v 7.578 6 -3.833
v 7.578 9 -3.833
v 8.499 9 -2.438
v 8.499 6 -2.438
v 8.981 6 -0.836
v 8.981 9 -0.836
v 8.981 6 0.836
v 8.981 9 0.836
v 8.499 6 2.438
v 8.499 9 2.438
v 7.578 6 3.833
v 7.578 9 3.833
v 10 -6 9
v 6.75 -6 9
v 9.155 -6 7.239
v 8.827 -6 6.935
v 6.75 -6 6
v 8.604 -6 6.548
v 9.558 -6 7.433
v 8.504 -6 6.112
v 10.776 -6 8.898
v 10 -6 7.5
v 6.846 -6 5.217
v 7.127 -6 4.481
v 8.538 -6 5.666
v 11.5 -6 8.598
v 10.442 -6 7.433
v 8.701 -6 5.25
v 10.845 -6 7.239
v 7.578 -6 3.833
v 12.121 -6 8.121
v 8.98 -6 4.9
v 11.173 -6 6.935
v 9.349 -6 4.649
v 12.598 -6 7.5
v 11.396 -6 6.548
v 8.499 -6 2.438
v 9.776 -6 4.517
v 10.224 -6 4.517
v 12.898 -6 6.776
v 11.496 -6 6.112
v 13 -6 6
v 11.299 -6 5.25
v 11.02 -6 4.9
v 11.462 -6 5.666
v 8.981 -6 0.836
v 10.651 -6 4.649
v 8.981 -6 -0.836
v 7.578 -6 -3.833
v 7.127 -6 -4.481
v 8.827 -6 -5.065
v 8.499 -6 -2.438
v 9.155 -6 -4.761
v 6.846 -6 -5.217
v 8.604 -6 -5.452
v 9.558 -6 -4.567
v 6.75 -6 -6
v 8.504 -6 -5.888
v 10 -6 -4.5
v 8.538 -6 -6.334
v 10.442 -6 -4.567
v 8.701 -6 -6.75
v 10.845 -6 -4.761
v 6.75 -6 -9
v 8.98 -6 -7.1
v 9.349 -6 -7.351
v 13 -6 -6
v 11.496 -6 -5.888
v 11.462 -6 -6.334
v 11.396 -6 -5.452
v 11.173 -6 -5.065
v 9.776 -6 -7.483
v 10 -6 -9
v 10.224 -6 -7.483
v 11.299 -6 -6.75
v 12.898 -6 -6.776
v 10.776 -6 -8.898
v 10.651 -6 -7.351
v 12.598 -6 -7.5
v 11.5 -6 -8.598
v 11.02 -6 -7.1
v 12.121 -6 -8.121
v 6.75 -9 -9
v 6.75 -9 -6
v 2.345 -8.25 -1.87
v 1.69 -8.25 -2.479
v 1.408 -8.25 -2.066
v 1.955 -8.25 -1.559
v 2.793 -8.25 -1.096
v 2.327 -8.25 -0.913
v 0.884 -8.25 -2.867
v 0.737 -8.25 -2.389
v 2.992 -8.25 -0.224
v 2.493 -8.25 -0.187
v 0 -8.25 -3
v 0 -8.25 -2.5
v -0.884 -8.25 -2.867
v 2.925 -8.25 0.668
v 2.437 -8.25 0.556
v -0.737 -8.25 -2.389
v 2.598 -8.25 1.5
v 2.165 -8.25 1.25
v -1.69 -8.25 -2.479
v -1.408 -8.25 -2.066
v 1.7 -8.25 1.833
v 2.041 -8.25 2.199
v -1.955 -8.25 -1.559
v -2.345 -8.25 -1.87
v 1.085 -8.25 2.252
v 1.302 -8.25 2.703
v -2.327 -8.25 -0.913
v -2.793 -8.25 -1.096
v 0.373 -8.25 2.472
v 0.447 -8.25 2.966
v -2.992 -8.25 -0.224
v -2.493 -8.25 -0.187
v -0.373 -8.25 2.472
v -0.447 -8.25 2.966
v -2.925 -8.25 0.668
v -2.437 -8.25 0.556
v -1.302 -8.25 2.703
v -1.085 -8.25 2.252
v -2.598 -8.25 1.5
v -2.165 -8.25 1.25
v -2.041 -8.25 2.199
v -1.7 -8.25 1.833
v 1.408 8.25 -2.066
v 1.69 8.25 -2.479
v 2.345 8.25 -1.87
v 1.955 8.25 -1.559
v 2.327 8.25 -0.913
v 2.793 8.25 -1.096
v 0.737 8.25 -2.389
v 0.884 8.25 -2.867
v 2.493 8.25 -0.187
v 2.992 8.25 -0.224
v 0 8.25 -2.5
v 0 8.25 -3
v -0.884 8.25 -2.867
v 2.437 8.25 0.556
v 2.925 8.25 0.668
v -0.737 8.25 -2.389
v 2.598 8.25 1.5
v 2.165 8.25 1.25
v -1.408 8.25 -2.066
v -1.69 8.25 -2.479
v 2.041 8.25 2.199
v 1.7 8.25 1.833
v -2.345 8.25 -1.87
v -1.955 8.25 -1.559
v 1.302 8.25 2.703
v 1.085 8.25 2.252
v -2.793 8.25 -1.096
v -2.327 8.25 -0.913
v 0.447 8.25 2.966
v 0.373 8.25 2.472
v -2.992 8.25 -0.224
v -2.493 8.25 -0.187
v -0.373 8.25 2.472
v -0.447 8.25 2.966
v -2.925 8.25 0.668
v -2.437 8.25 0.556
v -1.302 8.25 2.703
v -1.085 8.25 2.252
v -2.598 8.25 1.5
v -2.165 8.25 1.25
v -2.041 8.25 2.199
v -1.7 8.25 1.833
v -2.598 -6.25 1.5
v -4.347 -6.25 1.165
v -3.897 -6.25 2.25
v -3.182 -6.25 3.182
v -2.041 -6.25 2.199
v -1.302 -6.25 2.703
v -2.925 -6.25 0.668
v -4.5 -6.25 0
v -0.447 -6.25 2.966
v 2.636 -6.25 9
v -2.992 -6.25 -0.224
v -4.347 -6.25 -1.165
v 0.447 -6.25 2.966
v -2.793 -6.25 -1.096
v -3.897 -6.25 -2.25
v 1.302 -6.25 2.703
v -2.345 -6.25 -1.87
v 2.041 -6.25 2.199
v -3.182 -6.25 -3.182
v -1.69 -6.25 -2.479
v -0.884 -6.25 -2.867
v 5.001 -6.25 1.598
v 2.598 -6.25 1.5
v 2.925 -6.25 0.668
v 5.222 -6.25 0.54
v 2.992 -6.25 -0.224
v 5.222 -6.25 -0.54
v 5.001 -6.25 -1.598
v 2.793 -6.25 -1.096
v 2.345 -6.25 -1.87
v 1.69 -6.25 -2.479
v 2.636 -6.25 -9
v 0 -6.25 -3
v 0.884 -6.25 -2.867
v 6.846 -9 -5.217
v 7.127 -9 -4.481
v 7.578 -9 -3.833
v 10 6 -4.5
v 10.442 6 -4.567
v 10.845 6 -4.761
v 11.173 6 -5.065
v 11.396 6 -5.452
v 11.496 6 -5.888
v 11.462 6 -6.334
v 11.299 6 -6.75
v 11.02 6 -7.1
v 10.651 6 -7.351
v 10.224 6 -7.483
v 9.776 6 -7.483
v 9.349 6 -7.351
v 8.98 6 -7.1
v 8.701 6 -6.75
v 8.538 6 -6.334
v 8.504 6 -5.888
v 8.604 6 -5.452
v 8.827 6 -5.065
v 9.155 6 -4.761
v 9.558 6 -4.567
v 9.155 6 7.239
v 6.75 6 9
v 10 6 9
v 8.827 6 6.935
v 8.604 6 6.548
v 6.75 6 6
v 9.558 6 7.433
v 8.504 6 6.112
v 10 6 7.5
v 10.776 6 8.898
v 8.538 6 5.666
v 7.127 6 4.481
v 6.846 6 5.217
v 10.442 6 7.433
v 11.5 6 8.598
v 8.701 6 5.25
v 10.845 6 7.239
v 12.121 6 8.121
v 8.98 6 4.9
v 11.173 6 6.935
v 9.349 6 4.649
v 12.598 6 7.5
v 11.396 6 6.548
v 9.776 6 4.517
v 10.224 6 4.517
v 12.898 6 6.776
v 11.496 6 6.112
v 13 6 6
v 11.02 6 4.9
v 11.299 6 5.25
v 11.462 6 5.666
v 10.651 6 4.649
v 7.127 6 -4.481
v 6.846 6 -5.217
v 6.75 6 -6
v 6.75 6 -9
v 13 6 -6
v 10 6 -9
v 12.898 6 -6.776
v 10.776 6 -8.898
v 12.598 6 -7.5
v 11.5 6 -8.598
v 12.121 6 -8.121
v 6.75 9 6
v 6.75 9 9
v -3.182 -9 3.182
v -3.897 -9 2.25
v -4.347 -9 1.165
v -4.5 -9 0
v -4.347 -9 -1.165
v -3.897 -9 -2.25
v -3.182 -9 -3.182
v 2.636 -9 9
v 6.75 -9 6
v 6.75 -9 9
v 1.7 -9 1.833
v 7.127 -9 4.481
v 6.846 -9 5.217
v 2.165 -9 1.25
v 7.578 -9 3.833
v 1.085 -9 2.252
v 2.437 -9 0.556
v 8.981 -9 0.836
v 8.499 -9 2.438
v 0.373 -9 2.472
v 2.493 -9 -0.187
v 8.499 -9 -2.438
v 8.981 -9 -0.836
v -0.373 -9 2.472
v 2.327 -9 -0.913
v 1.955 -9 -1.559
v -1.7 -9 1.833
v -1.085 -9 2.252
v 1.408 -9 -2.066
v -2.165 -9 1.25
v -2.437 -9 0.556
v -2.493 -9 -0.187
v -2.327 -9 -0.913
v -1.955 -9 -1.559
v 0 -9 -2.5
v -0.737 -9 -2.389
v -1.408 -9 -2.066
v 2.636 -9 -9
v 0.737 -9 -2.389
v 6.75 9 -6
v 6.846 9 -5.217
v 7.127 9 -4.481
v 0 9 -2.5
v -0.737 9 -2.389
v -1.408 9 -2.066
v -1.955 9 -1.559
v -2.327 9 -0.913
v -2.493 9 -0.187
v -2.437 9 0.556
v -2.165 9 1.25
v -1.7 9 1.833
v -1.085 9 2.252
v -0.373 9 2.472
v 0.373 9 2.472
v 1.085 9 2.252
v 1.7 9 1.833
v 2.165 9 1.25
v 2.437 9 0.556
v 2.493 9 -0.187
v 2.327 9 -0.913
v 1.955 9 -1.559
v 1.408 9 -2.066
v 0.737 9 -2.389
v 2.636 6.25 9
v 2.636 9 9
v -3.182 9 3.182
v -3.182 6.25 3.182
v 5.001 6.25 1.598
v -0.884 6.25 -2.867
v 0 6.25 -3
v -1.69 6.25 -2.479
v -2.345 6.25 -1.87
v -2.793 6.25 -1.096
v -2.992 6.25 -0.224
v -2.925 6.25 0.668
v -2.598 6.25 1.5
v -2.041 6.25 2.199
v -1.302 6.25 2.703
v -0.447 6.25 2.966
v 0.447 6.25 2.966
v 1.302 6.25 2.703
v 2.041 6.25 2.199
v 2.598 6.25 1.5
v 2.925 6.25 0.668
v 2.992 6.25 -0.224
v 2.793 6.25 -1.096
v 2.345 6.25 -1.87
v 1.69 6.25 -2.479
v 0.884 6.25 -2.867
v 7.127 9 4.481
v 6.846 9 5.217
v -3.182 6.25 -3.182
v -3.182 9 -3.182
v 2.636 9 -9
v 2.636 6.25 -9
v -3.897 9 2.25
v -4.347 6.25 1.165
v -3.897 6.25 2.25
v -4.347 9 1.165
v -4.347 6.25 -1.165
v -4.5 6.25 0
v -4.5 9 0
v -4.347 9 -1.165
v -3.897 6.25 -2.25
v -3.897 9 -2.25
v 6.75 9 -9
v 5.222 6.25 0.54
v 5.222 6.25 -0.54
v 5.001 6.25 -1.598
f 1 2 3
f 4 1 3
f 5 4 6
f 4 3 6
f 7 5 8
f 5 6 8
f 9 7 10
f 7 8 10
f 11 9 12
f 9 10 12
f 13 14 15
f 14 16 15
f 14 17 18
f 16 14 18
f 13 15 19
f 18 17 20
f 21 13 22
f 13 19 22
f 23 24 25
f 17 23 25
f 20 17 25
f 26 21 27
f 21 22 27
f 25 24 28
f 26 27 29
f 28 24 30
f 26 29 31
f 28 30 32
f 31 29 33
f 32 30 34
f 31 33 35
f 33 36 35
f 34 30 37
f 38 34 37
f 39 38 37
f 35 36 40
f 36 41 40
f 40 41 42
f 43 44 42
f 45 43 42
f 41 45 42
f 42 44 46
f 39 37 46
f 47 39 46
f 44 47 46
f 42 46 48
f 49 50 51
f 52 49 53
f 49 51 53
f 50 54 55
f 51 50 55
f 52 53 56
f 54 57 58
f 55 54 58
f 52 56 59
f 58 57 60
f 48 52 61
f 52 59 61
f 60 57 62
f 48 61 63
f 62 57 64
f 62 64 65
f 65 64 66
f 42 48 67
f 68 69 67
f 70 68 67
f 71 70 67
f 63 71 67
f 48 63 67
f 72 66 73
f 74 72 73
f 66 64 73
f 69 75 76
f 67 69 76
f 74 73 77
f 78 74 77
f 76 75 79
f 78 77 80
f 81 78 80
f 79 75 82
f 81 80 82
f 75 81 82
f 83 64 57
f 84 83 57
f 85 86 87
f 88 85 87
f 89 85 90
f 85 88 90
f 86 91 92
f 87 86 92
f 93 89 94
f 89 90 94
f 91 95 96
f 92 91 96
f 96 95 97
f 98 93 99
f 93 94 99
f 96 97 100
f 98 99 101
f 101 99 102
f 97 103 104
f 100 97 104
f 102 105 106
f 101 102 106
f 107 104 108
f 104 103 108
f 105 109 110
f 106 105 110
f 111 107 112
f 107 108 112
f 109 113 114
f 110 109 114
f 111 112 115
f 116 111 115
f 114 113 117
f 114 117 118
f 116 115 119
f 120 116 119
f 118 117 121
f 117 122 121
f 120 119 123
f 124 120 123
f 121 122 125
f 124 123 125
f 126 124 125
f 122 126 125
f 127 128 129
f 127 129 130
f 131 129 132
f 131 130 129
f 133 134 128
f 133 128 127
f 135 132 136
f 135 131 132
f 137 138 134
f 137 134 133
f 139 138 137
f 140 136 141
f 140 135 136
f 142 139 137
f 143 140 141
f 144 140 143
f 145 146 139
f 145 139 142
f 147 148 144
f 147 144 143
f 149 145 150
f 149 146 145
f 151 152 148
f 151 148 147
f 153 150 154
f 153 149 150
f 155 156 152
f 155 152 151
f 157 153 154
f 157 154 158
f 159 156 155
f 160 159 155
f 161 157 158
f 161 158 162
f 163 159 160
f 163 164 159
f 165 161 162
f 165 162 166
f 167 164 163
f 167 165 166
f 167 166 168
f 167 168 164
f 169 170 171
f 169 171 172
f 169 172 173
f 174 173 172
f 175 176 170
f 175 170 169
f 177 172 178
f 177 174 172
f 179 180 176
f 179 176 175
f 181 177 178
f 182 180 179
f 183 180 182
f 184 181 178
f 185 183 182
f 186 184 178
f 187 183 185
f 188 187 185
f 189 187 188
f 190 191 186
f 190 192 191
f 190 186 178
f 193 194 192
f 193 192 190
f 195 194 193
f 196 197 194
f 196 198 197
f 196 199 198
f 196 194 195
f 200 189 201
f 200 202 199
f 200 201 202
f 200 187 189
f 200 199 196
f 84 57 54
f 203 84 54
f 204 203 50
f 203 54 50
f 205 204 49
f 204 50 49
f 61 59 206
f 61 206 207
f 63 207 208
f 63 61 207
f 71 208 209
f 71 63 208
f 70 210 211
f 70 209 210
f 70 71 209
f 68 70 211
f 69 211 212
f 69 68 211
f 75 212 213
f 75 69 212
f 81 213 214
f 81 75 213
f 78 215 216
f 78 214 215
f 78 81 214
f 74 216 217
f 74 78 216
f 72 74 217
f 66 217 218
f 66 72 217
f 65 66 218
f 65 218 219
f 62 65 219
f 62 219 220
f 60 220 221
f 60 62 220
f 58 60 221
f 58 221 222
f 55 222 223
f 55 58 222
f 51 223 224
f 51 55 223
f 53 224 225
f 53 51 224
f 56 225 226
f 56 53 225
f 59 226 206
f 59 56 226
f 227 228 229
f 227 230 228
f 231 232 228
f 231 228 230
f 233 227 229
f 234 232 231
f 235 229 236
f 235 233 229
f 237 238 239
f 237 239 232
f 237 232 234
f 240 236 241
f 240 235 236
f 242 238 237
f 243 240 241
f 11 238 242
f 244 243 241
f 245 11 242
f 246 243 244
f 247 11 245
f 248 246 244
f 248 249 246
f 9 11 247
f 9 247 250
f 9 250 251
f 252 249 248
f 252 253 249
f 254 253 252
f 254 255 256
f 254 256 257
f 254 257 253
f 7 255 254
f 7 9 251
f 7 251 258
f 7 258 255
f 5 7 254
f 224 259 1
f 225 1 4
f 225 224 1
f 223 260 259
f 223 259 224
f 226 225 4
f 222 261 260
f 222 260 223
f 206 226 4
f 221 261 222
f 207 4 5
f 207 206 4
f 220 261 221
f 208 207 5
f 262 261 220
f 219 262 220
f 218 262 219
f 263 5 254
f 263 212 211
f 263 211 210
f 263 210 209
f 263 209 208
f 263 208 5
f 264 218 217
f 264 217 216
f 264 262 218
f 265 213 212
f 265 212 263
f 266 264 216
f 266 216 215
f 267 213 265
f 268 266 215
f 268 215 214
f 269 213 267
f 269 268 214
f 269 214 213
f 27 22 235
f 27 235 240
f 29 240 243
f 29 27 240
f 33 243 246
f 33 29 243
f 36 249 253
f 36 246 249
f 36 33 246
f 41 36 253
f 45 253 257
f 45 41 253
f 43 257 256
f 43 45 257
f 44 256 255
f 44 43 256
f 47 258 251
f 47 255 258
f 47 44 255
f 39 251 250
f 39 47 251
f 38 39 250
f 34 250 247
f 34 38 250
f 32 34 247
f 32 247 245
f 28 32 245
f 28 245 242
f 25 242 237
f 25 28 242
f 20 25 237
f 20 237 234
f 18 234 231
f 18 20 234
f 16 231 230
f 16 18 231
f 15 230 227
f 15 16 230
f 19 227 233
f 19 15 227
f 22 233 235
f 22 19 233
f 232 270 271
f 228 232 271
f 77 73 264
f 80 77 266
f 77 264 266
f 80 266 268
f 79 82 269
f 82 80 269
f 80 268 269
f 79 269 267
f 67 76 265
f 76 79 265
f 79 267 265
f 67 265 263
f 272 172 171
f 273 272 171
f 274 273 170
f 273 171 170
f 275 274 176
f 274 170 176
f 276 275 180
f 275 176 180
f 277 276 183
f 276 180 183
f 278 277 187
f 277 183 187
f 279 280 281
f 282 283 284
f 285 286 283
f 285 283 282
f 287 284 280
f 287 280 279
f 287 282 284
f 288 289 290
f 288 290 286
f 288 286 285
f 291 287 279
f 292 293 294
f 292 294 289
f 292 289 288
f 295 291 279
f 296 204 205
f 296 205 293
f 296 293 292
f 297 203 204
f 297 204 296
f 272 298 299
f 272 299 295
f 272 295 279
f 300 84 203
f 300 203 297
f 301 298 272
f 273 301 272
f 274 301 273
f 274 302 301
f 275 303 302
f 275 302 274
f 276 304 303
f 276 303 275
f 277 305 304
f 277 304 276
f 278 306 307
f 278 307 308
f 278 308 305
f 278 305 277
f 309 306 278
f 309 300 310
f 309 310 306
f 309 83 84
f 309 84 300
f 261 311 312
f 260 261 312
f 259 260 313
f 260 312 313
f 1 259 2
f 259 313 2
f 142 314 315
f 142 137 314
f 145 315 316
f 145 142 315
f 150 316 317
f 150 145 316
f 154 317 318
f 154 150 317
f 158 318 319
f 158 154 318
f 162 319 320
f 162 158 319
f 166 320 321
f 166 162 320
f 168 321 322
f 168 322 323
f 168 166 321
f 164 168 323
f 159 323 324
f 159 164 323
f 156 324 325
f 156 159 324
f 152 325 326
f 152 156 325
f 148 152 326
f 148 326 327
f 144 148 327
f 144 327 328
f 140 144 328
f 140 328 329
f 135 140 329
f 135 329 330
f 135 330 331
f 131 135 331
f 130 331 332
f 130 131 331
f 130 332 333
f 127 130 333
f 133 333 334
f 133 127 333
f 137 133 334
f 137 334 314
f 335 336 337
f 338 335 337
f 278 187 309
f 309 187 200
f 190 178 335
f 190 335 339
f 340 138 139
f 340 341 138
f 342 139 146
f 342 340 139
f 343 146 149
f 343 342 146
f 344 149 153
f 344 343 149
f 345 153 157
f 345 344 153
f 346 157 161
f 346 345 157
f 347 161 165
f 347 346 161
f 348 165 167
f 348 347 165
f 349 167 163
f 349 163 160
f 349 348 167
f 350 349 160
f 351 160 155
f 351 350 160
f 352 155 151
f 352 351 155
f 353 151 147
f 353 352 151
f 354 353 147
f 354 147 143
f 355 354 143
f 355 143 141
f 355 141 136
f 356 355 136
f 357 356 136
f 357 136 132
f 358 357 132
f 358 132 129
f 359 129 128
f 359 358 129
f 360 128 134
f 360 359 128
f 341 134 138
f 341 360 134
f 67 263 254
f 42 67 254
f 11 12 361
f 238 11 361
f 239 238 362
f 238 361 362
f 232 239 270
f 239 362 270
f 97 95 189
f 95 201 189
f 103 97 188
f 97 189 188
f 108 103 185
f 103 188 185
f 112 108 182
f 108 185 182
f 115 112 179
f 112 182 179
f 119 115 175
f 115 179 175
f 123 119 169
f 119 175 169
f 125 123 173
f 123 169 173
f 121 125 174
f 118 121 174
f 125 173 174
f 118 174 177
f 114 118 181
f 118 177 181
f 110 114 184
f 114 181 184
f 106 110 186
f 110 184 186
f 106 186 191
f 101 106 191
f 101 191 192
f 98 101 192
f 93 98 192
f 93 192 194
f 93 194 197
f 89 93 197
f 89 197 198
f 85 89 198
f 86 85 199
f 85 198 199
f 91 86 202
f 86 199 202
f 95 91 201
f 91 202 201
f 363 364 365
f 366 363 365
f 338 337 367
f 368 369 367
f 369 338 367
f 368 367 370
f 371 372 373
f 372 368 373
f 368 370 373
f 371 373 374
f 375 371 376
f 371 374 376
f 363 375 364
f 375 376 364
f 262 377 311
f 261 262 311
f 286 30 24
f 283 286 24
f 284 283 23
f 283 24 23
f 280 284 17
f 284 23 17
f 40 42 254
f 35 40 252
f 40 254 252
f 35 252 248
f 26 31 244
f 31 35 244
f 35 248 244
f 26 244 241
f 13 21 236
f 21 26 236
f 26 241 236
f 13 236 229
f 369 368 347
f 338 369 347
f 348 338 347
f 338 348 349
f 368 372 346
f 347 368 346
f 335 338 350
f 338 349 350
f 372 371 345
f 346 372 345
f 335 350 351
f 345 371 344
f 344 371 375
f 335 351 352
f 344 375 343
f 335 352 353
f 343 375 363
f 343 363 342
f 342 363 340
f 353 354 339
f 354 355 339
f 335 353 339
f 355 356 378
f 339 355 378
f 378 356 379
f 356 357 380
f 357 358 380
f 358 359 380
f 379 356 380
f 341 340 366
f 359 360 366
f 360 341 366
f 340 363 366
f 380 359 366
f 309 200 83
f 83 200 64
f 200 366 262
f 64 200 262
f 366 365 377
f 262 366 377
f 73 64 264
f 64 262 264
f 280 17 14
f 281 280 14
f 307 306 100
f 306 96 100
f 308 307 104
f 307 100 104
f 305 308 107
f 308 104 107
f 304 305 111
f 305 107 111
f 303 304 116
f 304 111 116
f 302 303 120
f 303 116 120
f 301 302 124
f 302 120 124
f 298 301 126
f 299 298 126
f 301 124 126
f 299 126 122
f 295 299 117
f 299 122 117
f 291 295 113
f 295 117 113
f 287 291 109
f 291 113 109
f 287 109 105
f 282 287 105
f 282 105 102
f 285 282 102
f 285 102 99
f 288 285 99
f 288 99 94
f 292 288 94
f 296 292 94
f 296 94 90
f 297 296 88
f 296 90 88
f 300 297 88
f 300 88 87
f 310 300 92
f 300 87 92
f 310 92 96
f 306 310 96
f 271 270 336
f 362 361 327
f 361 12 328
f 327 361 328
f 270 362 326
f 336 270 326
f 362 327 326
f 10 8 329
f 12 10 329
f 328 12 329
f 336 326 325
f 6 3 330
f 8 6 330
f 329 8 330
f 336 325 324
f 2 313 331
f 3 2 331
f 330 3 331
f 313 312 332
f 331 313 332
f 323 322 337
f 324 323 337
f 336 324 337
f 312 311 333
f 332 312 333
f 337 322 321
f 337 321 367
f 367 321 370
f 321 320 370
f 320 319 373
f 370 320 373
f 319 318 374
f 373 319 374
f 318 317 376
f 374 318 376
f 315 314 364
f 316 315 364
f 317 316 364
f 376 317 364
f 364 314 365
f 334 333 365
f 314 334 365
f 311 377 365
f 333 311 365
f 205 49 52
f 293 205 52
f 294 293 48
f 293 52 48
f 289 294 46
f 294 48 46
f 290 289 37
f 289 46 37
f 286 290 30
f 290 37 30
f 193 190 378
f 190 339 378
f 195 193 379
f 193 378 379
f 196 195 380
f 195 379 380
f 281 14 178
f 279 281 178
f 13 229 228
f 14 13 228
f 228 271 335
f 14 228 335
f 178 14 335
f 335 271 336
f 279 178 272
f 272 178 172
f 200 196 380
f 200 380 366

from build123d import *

# Parameters (mm, degrees)
SKETCH1_R           = 1.5
BOSS_EXTRUDE1_DEPTH = 9
CUT_EXTRUDE1_DEPTH  = 6.25
CUT_EXTRUDE2_START  = 9
CUT_EXTRUDE2_DEPTH  = 3
CUT_EXTRUDE3_START  = -6
CUT_EXTRUDE3_DEPTH  = 3


with BuildPart() as part:
    # Sketch1 → Boss-Extrude1 (new, symmetric)
    with BuildSketch(Plane(origin=(0, 0, 0), x_dir=(1, 0, 0), z_dir=(0, 1, 0))):
        with BuildLine():
            Line((13, 6), (13, -6))
            ThreePointArc((13, -6), (12.121320344, -8.121320344), (10, -9))
            Line((10, -9), (2.636038969, -9))
            Line((2.636038969, -9), (-3.181980515, -3.181980515))
            ThreePointArc((-3.181980515, -3.181980515), (-4.5, 0), (-3.181980515, 3.181980515))
            Line((-3.181980515, 3.181980515), (2.636038969, 9))
            Line((2.636038969, 9), (10, 9))
            ThreePointArc((10, 9), (12.121320344, 8.121320344), (13, 6))
        make_face()
        with Locations(Location((10, 6, 0), (0, 0, 270))):
            Circle(SKETCH1_R, mode=Mode.SUBTRACT)
        with Locations(Location((10, -6, 0), (0, 0, 270))):
            Circle(SKETCH1_R, mode=Mode.SUBTRACT)
    extrude(amount=BOSS_EXTRUDE1_DEPTH, both=True)

    # Sketch2 → Cut-Extrude1 (cut, symmetric)
    with BuildSketch(Plane(origin=(0, 0, 0), x_dir=(1, 0, 0), z_dir=(0, 1, 0))):
        with BuildLine():
            Line((5.000969408, 1.597749973), (2.636038969, 9))
            Line((2.636038969, 9), (-3.181980515, 3.181980515))
            ThreePointArc((-3.181980515, 3.181980515), (-4.5, 0), (-3.181980515, -3.181980515))
            Line((-3.181980515, -3.181980515), (2.636038969, -9))
            Line((2.636038969, -9), (5.000969408, -1.597749973))
            ThreePointArc((5.000969408, -1.597749973), (5.25, 0), (5.000969408, 1.597749973))
        make_face()
    extrude(amount=CUT_EXTRUDE1_DEPTH, both=True, mode=Mode.SUBTRACT)

    # Sketch3 → Cut-Revolve1 (revolve, cut)
    with BuildSketch(Plane.XY, mode=Mode.PRIVATE) as cut_revolve1_sk:
        Polygon((-2.5, 9), (-2.5, 8.25), (-3, 8.25), (-3, 6.25), (0, 6.25), (0, 9), align=None)
        Polygon((0, -6.25), (0, -9), (-2.5, -9), (-2.5, -8.25), (-3, -8.25), (-3, -6.25), align=None)
    revolve(cut_revolve1_sk.sketch.rotate(Axis((0, -11.503843925, 0), (0, 1, 0)), 270), axis=Axis((0, -11.503843925, 0), (0, 1, 0)), mode=Mode.SUBTRACT)

    # Sketch4 → Cut-Extrude2 (cut)
    with BuildSketch(Plane(origin=(0, 0, 0), x_dir=(1, 0, 0), z_dir=(0, 1, 0)).offset(CUT_EXTRUDE2_START)):
        with BuildLine():
            Line((6.75, -9), (10, -9))
            ThreePointArc((10, -9), (12.121320344, -8.121320344), (13, -6))
            Line((13, -6), (13, 6))
            ThreePointArc((13, 6), (12.121320344, 8.121320344), (10, 9))
            Line((10, 9), (6.75, 9))
            Line((6.75, 9), (6.75, 6))
            ThreePointArc((6.75, 6), (6.963939833, 4.840328208), (7.577593024, 3.833333333))
            ThreePointArc((7.577593024, 3.833333333), (9.041796068, 0), (7.577593024, -3.833333333))
            ThreePointArc((7.577593024, -3.833333333), (6.963939833, -4.840328208), (6.75, -6))
            Line((6.75, -6), (6.75, -9))
        make_face()
    extrude(amount=-CUT_EXTRUDE2_DEPTH, mode=Mode.SUBTRACT)

    # Sketch4<2> → Cut-Extrude3 (cut)
    with BuildSketch(Plane(origin=(0, 0, 0), x_dir=(1, 0, 0), z_dir=(0, 1, 0)).offset(CUT_EXTRUDE3_START)):
        with BuildLine():
            Line((6.75, -9), (10, -9))
            ThreePointArc((10, -9), (12.121320344, -8.121320344), (13, -6))
            Line((13, -6), (13, 6))
            ThreePointArc((13, 6), (12.121320344, 8.121320344), (10, 9))
            Line((10, 9), (6.75, 9))
            Line((6.75, 9), (6.75, 6))
            ThreePointArc((6.75, 6), (6.963939833, 4.840328208), (7.577593024, 3.833333333))
            ThreePointArc((7.577593024, 3.833333333), (9.041796068, 0), (7.577593024, -3.833333333))
            ThreePointArc((7.577593024, -3.833333333), (6.963939833, -4.840328208), (6.75, -6))
            Line((6.75, -6), (6.75, -9))
        make_face()
    extrude(amount=-CUT_EXTRUDE3_DEPTH, mode=Mode.SUBTRACT)


solid = part.part
